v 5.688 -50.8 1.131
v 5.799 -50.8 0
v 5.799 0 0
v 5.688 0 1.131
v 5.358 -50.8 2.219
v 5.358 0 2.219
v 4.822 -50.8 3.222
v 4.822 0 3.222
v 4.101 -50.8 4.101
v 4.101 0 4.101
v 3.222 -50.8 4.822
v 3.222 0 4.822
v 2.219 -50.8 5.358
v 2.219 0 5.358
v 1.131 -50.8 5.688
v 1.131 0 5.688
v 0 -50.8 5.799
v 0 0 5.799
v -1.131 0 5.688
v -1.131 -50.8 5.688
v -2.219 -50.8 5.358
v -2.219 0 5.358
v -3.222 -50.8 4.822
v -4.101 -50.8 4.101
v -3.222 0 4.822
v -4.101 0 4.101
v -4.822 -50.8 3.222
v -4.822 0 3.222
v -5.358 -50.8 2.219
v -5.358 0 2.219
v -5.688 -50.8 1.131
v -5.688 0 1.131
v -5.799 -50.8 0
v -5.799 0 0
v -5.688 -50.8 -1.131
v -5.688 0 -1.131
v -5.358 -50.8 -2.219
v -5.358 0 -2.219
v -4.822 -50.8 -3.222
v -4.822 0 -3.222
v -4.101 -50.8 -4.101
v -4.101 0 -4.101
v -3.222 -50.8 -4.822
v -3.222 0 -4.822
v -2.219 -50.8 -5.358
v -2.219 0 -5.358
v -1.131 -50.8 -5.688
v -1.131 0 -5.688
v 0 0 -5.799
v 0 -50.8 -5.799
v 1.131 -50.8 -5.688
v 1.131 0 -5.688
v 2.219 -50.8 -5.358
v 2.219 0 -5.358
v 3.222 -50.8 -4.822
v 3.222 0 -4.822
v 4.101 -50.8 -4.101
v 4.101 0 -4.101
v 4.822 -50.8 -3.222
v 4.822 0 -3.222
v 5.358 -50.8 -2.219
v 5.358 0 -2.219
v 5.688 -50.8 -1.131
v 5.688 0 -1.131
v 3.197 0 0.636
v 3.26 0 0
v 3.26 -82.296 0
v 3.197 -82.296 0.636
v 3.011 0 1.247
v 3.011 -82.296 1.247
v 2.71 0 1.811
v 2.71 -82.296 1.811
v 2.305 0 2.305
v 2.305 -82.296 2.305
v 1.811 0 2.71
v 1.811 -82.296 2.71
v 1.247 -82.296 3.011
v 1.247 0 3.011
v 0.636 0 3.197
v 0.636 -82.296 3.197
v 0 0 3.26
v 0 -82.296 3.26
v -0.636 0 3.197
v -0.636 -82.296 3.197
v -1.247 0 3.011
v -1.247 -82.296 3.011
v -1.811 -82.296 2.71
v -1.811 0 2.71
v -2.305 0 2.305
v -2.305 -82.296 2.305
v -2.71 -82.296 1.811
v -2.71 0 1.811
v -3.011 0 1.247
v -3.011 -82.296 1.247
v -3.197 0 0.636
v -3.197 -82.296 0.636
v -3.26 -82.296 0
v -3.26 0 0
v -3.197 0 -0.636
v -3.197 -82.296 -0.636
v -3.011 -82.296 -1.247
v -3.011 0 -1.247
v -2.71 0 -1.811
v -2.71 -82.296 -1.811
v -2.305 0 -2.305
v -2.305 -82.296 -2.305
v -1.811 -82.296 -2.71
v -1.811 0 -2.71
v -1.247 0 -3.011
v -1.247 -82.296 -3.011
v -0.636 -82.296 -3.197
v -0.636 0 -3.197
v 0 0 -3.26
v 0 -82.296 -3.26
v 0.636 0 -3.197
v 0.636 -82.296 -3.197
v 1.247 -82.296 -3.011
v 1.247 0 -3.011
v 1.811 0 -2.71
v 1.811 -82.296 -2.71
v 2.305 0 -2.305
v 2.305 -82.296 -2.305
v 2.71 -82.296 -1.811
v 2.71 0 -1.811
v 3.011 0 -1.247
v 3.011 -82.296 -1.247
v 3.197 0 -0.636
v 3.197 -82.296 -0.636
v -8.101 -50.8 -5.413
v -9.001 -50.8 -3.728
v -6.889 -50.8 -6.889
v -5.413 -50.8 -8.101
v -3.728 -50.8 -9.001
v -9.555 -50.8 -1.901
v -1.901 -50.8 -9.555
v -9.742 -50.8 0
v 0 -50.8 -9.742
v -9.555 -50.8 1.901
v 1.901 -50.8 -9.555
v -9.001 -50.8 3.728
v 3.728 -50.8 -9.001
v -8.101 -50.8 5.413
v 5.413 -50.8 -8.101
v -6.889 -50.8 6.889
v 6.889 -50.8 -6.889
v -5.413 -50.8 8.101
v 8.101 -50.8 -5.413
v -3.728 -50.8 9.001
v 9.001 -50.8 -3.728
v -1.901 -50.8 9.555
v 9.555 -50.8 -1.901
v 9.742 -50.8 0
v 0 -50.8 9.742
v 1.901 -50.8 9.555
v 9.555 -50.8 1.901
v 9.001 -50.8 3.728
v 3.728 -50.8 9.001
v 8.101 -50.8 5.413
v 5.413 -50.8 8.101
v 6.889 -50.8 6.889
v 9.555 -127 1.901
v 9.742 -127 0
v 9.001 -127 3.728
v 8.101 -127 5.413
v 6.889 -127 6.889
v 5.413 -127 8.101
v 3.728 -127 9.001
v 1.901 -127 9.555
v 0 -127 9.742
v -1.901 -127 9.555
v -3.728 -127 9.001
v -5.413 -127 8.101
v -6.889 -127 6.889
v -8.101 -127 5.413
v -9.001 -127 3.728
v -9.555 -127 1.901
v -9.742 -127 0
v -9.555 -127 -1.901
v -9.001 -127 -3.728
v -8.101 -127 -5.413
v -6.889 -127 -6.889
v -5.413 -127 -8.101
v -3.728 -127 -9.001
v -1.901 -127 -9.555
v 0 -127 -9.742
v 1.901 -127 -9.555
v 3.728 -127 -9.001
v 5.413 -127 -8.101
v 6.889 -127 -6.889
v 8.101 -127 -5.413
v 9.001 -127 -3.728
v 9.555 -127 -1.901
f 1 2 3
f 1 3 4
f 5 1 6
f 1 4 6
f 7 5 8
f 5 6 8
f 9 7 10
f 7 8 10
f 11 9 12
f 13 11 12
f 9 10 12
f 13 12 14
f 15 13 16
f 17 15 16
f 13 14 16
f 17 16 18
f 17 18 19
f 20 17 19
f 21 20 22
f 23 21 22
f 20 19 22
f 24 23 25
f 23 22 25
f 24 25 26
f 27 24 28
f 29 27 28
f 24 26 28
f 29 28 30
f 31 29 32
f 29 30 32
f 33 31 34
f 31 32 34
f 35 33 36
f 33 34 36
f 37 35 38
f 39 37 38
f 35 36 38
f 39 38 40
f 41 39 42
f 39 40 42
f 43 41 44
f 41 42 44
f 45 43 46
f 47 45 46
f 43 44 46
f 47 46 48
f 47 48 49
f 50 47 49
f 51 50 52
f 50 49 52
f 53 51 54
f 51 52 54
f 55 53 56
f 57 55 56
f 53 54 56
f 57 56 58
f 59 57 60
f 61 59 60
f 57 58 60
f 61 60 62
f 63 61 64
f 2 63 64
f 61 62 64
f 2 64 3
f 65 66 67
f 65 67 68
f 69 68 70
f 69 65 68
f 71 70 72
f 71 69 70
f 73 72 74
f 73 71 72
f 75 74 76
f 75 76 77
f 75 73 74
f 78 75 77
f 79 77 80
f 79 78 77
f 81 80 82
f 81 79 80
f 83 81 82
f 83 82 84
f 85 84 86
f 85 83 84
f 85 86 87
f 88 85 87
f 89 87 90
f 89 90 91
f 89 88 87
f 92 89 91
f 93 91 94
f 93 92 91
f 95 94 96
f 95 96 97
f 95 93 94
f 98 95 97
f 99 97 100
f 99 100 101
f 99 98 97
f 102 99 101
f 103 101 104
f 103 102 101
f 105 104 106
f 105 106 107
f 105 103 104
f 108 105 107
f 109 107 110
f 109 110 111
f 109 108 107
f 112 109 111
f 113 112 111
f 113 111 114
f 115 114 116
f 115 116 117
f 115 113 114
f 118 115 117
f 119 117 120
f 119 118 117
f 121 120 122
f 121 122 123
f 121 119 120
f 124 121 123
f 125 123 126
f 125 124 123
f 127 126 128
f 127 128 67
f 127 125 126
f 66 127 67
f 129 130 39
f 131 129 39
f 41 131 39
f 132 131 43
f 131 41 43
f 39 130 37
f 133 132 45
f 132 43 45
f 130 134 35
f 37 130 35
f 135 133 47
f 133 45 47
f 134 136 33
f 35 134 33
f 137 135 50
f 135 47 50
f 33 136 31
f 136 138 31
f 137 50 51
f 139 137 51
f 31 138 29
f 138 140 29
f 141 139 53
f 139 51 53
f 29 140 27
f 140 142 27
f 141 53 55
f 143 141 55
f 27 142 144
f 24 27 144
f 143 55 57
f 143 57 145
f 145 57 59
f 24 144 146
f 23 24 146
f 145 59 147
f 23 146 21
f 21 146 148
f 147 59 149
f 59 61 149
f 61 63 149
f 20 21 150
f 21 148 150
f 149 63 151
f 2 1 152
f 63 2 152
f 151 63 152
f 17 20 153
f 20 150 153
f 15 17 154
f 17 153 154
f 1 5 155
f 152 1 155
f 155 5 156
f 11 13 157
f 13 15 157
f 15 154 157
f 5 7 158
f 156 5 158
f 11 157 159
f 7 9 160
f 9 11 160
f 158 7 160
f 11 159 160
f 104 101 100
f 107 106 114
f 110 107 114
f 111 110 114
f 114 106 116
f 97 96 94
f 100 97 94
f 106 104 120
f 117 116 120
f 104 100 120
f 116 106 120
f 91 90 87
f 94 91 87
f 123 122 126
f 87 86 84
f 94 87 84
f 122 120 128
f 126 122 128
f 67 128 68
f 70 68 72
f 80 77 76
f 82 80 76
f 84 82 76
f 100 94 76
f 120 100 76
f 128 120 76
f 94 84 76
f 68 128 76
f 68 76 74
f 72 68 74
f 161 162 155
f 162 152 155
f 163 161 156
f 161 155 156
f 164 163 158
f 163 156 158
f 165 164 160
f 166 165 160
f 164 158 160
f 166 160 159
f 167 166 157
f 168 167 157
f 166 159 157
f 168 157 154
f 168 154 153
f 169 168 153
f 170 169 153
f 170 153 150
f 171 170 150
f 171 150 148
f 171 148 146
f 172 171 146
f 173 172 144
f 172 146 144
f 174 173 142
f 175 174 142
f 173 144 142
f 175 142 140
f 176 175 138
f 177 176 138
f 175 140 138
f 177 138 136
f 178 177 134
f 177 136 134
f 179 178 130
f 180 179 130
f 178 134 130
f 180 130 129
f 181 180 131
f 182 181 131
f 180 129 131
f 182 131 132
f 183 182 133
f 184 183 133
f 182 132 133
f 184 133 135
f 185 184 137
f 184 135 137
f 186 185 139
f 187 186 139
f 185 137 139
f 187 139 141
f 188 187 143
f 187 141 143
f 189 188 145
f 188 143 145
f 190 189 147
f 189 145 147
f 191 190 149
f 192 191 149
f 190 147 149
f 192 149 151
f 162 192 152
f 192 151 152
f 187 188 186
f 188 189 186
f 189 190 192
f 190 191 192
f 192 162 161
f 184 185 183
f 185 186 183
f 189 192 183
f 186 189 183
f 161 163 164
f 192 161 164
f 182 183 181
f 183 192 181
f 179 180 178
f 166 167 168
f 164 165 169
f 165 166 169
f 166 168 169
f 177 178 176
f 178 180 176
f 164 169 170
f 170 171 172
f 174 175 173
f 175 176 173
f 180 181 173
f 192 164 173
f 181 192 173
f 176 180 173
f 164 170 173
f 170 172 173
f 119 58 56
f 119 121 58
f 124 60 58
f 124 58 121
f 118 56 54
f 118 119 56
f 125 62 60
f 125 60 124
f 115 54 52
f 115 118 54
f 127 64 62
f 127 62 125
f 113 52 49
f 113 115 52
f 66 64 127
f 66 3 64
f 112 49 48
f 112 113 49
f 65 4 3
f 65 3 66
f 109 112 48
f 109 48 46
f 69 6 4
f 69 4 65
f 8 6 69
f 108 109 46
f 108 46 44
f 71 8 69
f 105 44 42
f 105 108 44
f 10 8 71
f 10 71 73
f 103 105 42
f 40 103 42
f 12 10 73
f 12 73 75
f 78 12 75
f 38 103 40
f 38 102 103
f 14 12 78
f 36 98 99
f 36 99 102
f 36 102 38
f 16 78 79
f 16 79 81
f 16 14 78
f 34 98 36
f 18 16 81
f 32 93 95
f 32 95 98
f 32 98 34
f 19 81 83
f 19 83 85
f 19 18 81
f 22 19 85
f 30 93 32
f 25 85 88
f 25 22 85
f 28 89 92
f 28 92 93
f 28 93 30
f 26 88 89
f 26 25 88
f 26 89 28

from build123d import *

# Parameters (mm, degrees)
F0_W     = 5.799088
F0_H     = 50.8
F2_R     = 3.25962
F3_DEPTH = 82.296


with BuildPart() as f1:
    # F0 (on Top) → F1 (revolve)
    with BuildSketch(Plane.XY):
        with Locations((2.899544, -25.4)):
            Rectangle(F0_W, F0_H)
        Polygon((5.799088, -50.8), (0, -50.8), (0, -127), (9.742463, -127), (9.742463, -50.8), align=None)
    revolve(axis=Axis((0, -63.5, 0), (0, -1, 0)))


with BuildPart() as f3:
    # F2 (on Front) → F3 (new body)
    with BuildSketch(Plane.XZ):
        Circle(F2_R)
    extrude(amount=F3_DEPTH)


with BuildPart() as f1_1:
    add(f1.part)

    # F4: cut F3
    add(f3.part, mode=Mode.SUBTRACT)


solid = f1_1.part
